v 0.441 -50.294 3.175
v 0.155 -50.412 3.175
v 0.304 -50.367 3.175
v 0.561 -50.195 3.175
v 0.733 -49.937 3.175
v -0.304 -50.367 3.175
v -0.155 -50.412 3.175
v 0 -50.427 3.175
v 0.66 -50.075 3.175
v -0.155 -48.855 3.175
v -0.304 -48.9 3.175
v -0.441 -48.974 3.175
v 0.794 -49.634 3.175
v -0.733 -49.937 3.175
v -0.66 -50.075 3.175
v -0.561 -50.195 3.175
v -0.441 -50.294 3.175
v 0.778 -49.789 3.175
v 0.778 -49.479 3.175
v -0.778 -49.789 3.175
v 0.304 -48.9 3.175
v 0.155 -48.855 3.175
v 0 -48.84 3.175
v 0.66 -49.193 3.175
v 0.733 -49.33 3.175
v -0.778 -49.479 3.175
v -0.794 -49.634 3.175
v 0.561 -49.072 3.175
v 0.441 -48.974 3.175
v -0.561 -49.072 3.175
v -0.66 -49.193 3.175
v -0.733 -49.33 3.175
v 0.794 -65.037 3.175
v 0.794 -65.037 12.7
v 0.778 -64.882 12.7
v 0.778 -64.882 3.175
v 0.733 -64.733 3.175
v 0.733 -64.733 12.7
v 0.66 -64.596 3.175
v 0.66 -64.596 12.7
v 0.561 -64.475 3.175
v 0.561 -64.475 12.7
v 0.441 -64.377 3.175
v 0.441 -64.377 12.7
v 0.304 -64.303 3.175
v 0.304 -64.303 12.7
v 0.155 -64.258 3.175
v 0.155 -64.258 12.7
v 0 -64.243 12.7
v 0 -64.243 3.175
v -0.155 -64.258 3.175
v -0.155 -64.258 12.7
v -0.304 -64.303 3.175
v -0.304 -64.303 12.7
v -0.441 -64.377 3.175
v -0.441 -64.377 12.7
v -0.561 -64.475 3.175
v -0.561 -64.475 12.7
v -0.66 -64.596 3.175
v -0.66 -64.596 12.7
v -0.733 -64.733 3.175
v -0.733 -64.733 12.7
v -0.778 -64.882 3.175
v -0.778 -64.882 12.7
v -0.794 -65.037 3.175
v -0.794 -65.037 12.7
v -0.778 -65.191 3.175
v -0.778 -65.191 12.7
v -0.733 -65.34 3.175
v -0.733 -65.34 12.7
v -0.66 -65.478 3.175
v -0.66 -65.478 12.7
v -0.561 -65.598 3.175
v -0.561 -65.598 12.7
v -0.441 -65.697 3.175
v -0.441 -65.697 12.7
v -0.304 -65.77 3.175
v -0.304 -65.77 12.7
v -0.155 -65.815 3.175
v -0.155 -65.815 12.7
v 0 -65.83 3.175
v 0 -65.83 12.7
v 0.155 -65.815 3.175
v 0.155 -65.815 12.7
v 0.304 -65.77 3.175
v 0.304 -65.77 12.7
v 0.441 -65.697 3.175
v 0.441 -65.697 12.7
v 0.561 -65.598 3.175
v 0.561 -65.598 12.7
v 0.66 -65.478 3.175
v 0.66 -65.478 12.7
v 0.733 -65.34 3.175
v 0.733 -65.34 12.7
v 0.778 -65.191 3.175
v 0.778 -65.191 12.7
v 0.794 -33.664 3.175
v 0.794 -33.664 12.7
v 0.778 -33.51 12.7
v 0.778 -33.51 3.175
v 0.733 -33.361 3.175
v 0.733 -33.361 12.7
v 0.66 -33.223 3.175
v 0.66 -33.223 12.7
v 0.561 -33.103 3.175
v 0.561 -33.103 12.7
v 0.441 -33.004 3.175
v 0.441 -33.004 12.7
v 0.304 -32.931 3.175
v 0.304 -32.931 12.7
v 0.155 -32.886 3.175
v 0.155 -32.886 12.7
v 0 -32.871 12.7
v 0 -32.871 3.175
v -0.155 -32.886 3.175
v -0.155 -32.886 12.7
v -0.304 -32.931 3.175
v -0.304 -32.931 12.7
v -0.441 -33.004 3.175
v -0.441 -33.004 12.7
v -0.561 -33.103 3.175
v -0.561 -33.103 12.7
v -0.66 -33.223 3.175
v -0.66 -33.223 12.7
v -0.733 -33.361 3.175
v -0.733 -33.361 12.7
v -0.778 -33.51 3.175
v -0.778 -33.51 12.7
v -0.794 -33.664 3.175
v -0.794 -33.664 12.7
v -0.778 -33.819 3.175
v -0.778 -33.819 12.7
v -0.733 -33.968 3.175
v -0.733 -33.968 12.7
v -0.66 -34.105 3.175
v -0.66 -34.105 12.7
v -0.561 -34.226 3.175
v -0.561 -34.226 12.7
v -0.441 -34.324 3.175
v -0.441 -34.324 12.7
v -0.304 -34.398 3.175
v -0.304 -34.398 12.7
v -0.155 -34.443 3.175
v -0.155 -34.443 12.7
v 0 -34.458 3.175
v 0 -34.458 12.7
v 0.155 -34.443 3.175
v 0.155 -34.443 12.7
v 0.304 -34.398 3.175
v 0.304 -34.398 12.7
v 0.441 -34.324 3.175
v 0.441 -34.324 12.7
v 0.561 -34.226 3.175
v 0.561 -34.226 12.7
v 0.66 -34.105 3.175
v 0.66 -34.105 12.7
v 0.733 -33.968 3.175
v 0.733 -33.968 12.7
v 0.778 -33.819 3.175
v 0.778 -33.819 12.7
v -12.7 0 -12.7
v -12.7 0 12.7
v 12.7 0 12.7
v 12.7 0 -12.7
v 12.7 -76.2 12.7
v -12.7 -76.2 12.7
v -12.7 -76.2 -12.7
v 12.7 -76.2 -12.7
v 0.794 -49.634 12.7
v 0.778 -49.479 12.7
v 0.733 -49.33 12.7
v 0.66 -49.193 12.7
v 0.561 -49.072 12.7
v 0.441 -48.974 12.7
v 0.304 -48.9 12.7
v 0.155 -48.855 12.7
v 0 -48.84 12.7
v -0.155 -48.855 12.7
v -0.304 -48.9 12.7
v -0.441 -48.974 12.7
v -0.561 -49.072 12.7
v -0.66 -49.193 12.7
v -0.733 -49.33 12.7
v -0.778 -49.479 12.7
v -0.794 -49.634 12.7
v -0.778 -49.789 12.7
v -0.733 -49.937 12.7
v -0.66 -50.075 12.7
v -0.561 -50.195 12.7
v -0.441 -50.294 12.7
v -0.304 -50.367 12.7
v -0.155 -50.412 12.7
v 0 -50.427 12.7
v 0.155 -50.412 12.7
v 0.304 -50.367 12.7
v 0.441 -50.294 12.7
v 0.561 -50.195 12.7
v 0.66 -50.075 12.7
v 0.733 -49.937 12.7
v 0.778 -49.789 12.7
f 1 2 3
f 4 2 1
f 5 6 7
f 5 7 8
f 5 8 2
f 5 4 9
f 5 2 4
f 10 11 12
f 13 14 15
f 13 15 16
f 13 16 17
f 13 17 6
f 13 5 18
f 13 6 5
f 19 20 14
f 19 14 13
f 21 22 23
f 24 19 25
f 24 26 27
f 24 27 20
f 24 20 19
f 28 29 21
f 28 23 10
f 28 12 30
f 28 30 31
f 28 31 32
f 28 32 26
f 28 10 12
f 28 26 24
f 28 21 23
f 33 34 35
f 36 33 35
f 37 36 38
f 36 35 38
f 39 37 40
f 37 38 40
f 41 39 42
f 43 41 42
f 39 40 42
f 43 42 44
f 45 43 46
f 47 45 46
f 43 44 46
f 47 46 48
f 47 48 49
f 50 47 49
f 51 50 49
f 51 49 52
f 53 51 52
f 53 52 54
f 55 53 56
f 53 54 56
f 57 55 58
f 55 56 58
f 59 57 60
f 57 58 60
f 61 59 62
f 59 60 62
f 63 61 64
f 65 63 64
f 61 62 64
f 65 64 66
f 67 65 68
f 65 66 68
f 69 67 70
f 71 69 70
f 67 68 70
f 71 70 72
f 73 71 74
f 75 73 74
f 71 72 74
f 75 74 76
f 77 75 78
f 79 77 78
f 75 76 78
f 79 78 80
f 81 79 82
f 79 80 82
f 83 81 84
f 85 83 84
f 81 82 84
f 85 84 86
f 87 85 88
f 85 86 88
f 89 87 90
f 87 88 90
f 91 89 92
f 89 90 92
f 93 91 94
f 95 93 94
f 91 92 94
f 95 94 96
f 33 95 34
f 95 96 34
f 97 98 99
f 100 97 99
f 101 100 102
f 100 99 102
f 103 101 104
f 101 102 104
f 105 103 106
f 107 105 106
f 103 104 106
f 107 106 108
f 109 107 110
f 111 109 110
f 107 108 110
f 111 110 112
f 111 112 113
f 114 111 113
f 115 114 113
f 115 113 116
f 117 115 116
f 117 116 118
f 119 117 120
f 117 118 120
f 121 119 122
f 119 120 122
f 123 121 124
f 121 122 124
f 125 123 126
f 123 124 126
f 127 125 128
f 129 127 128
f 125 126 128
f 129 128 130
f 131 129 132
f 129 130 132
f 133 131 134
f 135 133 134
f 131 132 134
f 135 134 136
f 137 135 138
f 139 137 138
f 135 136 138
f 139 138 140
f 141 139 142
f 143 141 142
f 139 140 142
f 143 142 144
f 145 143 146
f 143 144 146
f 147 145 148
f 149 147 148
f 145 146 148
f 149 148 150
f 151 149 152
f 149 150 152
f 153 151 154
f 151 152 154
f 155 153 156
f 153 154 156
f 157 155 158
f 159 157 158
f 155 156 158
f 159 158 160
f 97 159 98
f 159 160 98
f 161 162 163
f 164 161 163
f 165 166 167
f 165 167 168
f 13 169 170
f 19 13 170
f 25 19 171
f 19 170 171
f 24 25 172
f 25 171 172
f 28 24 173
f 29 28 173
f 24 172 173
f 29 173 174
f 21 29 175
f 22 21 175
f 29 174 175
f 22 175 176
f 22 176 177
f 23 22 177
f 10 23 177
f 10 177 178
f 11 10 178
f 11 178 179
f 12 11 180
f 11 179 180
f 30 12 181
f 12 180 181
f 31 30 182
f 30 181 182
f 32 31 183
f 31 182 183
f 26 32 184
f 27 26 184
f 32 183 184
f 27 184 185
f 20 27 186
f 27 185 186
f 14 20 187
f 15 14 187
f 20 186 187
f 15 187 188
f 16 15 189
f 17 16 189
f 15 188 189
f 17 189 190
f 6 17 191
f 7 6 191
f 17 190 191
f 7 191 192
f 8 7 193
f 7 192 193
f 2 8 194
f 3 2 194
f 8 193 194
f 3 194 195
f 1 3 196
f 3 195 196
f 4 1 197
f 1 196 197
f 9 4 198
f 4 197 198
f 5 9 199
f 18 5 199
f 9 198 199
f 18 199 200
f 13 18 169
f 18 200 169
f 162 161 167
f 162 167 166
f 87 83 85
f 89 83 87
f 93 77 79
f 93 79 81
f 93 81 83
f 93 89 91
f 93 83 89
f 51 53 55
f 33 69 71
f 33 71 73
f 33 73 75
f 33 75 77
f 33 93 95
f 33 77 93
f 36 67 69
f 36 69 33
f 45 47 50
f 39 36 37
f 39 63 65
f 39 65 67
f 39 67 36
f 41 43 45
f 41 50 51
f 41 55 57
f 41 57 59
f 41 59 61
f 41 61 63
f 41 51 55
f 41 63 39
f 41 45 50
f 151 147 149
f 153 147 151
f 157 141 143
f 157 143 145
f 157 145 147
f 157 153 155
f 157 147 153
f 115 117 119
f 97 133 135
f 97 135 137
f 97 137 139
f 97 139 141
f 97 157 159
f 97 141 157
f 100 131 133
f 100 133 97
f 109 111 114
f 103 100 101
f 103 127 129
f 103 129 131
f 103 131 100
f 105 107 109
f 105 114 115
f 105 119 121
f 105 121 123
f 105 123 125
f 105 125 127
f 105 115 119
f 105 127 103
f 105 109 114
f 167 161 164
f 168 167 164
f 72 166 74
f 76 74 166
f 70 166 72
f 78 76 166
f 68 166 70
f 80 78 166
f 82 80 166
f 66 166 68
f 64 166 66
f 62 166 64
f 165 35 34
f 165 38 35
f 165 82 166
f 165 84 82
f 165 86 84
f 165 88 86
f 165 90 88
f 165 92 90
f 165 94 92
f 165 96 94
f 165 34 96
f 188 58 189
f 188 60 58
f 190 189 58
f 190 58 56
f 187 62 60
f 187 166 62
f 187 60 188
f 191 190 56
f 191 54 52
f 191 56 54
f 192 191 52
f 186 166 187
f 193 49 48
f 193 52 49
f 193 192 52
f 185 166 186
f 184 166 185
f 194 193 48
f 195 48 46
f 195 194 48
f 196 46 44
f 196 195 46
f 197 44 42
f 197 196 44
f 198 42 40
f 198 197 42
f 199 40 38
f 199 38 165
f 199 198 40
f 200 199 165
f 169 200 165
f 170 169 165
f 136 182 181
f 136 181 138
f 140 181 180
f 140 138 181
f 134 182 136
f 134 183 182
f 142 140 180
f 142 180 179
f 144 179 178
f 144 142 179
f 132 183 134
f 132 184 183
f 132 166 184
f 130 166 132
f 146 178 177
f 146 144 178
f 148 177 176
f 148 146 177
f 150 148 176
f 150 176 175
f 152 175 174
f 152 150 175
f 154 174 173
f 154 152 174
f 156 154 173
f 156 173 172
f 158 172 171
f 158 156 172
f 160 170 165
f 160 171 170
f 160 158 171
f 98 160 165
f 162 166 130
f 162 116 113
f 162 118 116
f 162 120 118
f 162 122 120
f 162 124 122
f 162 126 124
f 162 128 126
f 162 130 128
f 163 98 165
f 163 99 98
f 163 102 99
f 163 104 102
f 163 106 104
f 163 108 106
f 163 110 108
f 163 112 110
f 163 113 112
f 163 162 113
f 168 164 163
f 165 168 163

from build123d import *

# Parameters (mm, degrees)
F0_W     = 25.4
F0_H     = 25.4
F1_DEPTH = 76.2
F2_R     = 0.79375
F3_DEPTH = 9.525


with BuildPart() as f1:
    # F0 (on Front) → F1 (new body)
    with BuildSketch(Plane.XZ):
        Rectangle(F0_W, F0_H)
    extrude(amount=F1_DEPTH)

    # F2 (on face) → F3 (cut)
    with BuildSketch(Plane.XY.offset(12.7)):
        with Locations((0, -33.664466)):
            Circle(F2_R)
        with Locations((0, -49.633727)):
            Circle(F2_R)
        with Locations((0, -65.036638)):
            Circle(F2_R)
    extrude(amount=-F3_DEPTH, mode=Mode.SUBTRACT)


solid = f1.part
